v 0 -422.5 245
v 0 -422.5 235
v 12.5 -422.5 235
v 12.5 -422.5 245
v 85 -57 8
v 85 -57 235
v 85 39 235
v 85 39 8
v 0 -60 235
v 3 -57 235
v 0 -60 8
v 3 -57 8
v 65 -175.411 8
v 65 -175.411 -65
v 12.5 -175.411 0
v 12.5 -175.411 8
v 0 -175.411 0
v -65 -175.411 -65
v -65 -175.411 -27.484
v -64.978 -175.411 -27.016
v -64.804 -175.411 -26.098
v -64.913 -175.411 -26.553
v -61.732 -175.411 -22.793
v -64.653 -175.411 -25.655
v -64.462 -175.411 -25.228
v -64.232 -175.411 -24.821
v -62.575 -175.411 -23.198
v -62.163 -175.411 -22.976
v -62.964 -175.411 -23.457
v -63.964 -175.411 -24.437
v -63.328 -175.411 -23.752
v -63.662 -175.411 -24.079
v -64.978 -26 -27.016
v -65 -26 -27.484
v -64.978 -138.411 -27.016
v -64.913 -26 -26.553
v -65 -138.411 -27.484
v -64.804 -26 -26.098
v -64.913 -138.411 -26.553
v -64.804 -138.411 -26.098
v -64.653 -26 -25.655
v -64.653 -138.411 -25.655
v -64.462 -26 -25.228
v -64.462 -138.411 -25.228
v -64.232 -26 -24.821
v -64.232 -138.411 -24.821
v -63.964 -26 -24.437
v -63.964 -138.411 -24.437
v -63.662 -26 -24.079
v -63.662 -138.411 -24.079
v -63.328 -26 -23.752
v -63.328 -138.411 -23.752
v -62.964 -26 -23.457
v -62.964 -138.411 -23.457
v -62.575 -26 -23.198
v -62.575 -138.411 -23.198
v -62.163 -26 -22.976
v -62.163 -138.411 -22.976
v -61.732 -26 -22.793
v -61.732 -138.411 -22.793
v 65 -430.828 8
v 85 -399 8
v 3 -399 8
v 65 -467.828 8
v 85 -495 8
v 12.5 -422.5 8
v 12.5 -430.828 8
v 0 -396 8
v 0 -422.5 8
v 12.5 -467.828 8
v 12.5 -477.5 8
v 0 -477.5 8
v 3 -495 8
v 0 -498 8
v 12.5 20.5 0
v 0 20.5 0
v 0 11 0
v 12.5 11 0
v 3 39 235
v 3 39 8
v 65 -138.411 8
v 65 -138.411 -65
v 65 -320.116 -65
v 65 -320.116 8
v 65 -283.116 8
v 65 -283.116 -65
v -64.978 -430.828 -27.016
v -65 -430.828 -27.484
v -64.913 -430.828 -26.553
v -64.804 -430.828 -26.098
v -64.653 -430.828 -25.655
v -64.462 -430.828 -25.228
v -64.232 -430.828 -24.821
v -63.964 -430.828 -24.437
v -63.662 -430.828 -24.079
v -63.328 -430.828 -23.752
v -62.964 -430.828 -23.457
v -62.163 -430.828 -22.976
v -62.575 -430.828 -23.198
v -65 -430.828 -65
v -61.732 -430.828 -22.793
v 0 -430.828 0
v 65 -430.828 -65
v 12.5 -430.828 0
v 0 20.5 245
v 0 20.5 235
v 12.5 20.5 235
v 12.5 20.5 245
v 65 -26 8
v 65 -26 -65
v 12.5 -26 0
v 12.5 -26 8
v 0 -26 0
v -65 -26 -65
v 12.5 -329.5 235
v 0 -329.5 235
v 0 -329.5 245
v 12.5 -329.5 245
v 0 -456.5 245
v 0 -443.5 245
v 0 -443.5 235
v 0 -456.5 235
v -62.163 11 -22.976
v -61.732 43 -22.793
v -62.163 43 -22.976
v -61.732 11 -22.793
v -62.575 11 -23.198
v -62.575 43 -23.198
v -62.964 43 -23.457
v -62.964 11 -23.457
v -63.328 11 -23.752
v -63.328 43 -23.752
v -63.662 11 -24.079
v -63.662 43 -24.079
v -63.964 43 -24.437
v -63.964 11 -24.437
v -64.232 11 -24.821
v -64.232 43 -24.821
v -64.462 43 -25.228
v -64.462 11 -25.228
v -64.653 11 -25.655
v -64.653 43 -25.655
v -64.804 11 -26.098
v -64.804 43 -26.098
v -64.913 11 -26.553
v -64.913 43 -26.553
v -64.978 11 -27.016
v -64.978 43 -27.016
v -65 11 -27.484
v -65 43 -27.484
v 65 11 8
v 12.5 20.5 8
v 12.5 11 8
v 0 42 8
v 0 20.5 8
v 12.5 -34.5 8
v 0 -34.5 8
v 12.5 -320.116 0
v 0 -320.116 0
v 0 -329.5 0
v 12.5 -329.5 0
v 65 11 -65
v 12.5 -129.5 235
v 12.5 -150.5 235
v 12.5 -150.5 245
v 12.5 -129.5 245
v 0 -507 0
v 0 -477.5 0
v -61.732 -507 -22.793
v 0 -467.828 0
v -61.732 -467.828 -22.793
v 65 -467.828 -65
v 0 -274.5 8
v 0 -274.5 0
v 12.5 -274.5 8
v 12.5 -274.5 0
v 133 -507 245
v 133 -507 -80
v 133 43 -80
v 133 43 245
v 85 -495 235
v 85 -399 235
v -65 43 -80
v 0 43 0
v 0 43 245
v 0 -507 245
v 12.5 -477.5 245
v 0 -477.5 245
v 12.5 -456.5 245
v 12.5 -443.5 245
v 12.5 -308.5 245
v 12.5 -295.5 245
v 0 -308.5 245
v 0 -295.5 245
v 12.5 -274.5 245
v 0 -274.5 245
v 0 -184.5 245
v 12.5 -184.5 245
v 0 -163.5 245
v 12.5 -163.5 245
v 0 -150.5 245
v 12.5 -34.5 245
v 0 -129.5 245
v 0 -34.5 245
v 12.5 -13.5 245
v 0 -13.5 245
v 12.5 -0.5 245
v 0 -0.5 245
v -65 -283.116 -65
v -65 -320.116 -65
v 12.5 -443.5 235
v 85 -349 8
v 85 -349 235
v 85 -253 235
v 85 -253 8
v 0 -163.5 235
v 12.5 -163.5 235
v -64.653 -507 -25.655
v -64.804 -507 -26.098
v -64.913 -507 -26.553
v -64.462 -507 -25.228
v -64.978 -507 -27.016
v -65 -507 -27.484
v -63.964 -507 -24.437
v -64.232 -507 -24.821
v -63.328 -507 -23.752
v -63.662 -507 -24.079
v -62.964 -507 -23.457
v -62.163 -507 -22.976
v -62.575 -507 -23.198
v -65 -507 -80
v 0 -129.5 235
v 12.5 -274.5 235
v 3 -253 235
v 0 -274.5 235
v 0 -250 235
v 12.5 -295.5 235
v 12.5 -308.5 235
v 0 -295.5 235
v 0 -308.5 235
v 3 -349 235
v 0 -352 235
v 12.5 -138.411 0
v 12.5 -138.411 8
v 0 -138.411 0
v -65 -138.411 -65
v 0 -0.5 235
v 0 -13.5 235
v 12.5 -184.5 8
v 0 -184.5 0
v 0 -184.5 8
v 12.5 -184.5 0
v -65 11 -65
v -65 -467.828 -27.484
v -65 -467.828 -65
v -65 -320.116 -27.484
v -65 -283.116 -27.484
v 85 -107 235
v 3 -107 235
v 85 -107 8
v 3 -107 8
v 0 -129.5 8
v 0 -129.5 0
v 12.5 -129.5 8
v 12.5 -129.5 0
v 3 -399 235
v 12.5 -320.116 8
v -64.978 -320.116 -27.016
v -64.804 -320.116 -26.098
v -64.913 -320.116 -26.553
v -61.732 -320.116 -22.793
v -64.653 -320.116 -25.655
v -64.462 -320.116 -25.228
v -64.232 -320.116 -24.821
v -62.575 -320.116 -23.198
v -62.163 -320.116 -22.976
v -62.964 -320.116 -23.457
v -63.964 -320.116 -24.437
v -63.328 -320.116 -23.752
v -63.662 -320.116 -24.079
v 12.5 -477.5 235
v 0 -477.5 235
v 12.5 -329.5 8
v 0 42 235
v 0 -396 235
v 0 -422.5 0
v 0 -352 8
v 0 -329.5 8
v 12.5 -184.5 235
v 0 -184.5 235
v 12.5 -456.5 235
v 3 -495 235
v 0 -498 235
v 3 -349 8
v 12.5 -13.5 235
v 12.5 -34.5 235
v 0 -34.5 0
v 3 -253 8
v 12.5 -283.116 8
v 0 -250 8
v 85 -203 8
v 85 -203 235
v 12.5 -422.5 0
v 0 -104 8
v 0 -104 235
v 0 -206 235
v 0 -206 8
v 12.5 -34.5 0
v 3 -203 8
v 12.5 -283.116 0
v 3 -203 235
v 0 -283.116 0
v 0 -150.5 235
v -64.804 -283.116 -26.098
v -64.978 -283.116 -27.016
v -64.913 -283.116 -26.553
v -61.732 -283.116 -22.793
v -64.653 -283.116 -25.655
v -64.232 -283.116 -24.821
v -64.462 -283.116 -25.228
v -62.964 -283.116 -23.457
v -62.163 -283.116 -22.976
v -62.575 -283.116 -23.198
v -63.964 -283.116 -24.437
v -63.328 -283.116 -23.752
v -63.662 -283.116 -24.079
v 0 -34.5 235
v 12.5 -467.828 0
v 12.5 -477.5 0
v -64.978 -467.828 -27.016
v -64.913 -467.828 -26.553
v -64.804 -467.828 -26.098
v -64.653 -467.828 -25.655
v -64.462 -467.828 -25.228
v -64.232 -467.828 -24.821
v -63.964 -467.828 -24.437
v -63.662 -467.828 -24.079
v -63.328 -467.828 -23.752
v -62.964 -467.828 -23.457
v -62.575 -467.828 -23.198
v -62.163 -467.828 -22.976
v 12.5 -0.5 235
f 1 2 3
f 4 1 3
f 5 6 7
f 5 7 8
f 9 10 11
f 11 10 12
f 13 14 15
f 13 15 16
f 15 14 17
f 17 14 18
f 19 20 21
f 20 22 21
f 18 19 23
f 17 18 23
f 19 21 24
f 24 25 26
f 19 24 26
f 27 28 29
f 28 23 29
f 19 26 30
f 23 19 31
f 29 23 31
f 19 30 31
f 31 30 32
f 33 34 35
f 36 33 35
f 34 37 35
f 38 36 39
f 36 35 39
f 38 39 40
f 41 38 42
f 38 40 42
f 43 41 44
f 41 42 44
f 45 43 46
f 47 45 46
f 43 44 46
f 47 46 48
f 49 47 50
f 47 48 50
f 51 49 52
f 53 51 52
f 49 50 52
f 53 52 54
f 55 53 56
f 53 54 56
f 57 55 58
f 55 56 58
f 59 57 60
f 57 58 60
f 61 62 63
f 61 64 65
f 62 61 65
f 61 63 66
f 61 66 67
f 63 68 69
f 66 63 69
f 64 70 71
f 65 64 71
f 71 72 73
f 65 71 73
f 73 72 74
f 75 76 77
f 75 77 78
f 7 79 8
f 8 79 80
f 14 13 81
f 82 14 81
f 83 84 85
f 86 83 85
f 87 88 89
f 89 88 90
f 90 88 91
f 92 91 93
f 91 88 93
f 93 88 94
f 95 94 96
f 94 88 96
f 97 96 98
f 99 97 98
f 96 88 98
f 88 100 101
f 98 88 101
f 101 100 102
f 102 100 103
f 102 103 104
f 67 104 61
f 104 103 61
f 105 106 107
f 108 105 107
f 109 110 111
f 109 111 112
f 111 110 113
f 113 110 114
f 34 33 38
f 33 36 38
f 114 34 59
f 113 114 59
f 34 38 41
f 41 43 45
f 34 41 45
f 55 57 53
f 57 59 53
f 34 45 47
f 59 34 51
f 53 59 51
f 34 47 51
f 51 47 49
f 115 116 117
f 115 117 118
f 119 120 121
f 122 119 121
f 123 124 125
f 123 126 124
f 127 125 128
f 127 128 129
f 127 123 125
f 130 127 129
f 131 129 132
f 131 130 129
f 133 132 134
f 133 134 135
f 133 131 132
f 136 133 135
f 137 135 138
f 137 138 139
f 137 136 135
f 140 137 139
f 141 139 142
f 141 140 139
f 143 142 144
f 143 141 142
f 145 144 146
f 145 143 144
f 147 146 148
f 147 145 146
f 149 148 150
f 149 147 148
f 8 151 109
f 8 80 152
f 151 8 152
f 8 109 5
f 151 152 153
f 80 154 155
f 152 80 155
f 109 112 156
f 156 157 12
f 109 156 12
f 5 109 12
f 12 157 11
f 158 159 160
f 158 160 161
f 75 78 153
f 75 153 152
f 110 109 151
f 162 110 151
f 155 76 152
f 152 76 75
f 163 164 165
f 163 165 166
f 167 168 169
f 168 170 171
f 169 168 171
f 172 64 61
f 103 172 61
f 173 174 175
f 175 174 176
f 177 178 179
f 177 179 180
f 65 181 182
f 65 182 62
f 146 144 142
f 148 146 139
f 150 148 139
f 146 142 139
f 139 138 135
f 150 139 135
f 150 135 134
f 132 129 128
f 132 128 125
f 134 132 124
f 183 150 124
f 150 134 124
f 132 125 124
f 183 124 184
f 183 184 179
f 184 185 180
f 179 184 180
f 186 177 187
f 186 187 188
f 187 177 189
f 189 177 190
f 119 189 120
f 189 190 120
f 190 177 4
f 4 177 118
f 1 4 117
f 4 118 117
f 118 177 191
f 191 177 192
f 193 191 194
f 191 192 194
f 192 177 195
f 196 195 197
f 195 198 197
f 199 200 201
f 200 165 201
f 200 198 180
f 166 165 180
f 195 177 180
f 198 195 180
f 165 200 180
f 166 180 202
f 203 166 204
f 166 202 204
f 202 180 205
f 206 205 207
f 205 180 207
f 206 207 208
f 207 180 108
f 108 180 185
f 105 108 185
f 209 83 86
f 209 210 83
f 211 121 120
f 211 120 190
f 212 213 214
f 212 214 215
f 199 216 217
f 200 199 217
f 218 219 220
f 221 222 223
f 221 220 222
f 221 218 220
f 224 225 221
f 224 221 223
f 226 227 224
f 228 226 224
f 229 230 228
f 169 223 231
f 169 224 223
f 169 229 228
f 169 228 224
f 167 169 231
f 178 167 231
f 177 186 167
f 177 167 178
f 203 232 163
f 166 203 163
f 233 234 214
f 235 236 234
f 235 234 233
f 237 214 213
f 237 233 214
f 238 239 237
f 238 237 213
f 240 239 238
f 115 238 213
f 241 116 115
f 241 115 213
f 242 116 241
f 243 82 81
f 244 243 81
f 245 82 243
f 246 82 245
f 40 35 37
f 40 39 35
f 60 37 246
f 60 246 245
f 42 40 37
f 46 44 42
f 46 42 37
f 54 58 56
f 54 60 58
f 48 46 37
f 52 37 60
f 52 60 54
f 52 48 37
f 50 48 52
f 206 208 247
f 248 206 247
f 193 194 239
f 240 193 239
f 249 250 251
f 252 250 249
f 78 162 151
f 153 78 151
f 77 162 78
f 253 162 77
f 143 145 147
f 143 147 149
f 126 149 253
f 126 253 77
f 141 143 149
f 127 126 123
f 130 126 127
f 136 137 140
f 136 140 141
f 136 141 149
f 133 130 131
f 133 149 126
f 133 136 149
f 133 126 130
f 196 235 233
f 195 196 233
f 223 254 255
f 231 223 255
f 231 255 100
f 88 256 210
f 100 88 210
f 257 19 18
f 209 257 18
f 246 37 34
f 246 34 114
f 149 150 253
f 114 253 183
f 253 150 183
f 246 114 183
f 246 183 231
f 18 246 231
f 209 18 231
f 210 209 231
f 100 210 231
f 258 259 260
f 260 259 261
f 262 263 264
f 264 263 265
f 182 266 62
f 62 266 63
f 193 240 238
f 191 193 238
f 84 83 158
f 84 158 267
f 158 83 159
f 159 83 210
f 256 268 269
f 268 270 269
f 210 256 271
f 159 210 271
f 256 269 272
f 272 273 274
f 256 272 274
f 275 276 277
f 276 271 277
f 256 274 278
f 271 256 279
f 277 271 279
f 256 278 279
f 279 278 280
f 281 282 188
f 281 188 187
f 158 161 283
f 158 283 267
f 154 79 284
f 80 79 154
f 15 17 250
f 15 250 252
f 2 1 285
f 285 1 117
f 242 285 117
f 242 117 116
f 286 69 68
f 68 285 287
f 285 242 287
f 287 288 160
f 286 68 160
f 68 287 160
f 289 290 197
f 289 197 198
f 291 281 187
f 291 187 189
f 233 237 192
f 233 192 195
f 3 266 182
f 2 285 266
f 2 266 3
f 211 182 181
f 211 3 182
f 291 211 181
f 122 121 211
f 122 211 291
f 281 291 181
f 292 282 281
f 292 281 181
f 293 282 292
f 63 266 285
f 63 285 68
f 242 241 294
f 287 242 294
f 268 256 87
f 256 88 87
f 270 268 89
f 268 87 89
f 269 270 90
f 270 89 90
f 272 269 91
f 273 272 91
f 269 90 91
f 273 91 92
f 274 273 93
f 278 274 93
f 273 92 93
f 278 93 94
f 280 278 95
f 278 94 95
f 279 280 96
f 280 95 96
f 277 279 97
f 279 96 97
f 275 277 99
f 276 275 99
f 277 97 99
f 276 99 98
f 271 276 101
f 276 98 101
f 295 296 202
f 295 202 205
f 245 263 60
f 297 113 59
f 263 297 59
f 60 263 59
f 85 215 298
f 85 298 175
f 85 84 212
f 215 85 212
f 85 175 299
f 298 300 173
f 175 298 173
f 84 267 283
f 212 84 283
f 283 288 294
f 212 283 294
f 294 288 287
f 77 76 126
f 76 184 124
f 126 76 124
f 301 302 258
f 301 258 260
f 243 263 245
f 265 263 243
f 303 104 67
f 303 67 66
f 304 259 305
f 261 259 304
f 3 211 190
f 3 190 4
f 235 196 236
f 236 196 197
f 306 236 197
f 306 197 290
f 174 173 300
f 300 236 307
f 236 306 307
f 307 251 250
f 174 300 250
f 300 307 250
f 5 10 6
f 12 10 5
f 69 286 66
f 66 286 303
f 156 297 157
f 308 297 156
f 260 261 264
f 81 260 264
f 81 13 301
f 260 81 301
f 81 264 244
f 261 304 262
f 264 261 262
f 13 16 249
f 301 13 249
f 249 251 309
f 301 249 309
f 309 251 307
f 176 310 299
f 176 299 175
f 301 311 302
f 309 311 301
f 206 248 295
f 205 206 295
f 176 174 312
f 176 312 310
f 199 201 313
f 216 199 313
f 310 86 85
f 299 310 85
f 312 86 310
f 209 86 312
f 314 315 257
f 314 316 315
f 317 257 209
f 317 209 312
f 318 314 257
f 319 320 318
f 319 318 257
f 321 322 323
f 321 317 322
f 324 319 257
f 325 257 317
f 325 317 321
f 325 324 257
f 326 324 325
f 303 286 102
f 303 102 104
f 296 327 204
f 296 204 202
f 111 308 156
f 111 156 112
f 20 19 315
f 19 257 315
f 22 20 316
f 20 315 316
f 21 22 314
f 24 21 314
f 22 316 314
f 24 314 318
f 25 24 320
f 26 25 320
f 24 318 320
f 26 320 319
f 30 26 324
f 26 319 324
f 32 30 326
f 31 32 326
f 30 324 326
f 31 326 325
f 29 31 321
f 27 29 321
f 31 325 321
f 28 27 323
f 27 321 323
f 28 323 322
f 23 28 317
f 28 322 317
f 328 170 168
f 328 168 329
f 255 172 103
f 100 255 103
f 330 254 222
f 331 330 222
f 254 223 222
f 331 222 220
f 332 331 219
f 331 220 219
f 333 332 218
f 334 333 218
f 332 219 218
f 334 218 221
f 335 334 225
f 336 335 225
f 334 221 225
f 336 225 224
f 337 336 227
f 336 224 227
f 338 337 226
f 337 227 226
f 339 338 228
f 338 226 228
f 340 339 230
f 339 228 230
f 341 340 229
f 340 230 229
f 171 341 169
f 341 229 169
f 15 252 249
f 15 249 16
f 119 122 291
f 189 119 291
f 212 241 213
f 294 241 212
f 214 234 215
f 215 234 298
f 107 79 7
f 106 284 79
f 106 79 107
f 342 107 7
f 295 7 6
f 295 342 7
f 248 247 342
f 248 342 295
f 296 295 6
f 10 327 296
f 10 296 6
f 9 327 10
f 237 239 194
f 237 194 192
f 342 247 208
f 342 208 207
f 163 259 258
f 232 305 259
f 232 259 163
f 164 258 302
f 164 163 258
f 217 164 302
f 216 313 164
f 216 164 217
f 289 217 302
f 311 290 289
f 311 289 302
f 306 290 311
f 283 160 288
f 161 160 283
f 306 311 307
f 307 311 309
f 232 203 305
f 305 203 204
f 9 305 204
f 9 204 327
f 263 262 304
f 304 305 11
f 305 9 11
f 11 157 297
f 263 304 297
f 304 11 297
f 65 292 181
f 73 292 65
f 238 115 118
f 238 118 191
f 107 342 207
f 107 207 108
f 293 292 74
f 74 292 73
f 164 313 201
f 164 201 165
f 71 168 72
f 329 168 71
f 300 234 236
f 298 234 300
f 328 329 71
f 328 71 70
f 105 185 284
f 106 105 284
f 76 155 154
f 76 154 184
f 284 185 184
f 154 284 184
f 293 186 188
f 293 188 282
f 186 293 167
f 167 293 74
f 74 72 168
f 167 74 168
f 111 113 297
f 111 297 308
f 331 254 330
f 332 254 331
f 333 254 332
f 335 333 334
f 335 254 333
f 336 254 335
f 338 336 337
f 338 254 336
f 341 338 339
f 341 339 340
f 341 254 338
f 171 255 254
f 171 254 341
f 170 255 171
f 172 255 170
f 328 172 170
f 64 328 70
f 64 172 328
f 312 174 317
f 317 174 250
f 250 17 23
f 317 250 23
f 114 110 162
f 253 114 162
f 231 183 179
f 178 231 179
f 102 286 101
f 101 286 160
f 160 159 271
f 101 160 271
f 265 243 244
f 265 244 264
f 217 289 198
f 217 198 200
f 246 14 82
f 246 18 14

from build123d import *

# Parameters (mm, degrees)
PAD006_DEPTH    = 550
SKETCH015_W     = 227
SKETCH015_H     = 96
POCKET008_DEPTH = 85
SKETCH016_W     = 37
SKETCH016_H     = 140
POCKET009_DEPTH = 65
SKETCH019_W     = 12.5
SKETCH019_H     = 21
POCKET014_DEPTH = 245.001
FILLET_R        = 5
CHAMFER_SIZE    = 3


with BuildPart() as part:
    # Sketch014 → Pad006 (new body)
    with BuildSketch(Plane.XZ):
        Polygon((0, 245), (0, 0), (-65, -24), (-65, -80), (133, -80), (133, 245), align=None)
    extrude(amount=PAD006_DEPTH)

    # Sketch015 (on Face1 of Pad006) → Pocket008 (cut)
    with BuildSketch(Plane(origin=(0, 0, 0), x_dir=(0, 0, -1), z_dir=(-1, 0, 0))):
        with Locations((-121.5, 52)):
            Rectangle(SKETCH015_W, SKETCH015_H)
        with Locations((-121.5, 198)):
            Rectangle(SKETCH015_W, SKETCH015_H)
        with Locations((-121.5, 344)):
            Rectangle(SKETCH015_W, SKETCH015_H)
        with Locations((-121.5, 490)):
            Rectangle(SKETCH015_W, SKETCH015_H)
    extrude(amount=-POCKET008_DEPTH, mode=Mode.SUBTRACT)

    # Sketch016 → Pocket009 (cut, symmetric)
    with BuildSketch(Plane.YZ):
        with Locations((-50.5, 5)):
            Rectangle(SKETCH016_W, SKETCH016_H)
        with Locations((-199.911025, 5)):
            Rectangle(SKETCH016_W, SKETCH016_H)
        with Locations((-344.615598, 5)):
            Rectangle(SKETCH016_W, SKETCH016_H)
        with Locations((-492.327623, 5)):
            Rectangle(SKETCH016_W, SKETCH016_H)
    extrude(amount=POCKET009_DEPTH, both=True, mode=Mode.SUBTRACT)

    # Sketch019 → Pocket014 (cut, through all)
    with BuildSketch(Plane.XY):
        with Locations((6.25, -33)):
            Rectangle(SKETCH019_W, SKETCH019_H)
        with Locations((6.25, -67)):
            Rectangle(SKETCH019_W, SKETCH019_H)
        with Locations((6.25, -183)):
            Rectangle(SKETCH019_W, SKETCH019_H)
        with Locations((6.25, -217)):
            Rectangle(SKETCH019_W, SKETCH019_H)
        with Locations((6.25, -328)):
            Rectangle(SKETCH019_W, SKETCH019_H)
        with Locations((6.25, -362)):
            Rectangle(SKETCH019_W, SKETCH019_H)
        with Locations((6.25, -476)):
            Rectangle(SKETCH019_W, SKETCH019_H)
        with Locations((6.25, -510)):
            Rectangle(SKETCH019_W, SKETCH019_H)
    extrude(amount=POCKET014_DEPTH, mode=Mode.SUBTRACT)

    # Fillet
    fillet_edges = [part.edges().sort_by_distance(p)[0] for p in [
        (-65, -16, -24),
        (-65, -125.205513, -24),
        (-65, -272.263312, -24),
        (-65, -418.47161, -24),
        (-65, -530.413811, -24),
    ]]
    fillet(fillet_edges, radius=FILLET_R)

    # Chamfer
    chamfer_edges = [part.edges().sort_by_distance(p)[0] for p in [
        (0, -100, 121.5),
        (0, -150, 121.5),
        (0, -246, 121.5),
        (0, -296, 121.5),
        (0, -392, 121.5),
        (0, -442, 121.5),
        (0, -538, 121.5),
        (0, -4, 121.5),
    ]]
    chamfer(chamfer_edges, length=CHAMFER_SIZE)


with BuildPart() as part_1:
    # Body004 placement: moved
    add(part.part.moved(Location((0, 43, 0))))


solid = part_1.part
